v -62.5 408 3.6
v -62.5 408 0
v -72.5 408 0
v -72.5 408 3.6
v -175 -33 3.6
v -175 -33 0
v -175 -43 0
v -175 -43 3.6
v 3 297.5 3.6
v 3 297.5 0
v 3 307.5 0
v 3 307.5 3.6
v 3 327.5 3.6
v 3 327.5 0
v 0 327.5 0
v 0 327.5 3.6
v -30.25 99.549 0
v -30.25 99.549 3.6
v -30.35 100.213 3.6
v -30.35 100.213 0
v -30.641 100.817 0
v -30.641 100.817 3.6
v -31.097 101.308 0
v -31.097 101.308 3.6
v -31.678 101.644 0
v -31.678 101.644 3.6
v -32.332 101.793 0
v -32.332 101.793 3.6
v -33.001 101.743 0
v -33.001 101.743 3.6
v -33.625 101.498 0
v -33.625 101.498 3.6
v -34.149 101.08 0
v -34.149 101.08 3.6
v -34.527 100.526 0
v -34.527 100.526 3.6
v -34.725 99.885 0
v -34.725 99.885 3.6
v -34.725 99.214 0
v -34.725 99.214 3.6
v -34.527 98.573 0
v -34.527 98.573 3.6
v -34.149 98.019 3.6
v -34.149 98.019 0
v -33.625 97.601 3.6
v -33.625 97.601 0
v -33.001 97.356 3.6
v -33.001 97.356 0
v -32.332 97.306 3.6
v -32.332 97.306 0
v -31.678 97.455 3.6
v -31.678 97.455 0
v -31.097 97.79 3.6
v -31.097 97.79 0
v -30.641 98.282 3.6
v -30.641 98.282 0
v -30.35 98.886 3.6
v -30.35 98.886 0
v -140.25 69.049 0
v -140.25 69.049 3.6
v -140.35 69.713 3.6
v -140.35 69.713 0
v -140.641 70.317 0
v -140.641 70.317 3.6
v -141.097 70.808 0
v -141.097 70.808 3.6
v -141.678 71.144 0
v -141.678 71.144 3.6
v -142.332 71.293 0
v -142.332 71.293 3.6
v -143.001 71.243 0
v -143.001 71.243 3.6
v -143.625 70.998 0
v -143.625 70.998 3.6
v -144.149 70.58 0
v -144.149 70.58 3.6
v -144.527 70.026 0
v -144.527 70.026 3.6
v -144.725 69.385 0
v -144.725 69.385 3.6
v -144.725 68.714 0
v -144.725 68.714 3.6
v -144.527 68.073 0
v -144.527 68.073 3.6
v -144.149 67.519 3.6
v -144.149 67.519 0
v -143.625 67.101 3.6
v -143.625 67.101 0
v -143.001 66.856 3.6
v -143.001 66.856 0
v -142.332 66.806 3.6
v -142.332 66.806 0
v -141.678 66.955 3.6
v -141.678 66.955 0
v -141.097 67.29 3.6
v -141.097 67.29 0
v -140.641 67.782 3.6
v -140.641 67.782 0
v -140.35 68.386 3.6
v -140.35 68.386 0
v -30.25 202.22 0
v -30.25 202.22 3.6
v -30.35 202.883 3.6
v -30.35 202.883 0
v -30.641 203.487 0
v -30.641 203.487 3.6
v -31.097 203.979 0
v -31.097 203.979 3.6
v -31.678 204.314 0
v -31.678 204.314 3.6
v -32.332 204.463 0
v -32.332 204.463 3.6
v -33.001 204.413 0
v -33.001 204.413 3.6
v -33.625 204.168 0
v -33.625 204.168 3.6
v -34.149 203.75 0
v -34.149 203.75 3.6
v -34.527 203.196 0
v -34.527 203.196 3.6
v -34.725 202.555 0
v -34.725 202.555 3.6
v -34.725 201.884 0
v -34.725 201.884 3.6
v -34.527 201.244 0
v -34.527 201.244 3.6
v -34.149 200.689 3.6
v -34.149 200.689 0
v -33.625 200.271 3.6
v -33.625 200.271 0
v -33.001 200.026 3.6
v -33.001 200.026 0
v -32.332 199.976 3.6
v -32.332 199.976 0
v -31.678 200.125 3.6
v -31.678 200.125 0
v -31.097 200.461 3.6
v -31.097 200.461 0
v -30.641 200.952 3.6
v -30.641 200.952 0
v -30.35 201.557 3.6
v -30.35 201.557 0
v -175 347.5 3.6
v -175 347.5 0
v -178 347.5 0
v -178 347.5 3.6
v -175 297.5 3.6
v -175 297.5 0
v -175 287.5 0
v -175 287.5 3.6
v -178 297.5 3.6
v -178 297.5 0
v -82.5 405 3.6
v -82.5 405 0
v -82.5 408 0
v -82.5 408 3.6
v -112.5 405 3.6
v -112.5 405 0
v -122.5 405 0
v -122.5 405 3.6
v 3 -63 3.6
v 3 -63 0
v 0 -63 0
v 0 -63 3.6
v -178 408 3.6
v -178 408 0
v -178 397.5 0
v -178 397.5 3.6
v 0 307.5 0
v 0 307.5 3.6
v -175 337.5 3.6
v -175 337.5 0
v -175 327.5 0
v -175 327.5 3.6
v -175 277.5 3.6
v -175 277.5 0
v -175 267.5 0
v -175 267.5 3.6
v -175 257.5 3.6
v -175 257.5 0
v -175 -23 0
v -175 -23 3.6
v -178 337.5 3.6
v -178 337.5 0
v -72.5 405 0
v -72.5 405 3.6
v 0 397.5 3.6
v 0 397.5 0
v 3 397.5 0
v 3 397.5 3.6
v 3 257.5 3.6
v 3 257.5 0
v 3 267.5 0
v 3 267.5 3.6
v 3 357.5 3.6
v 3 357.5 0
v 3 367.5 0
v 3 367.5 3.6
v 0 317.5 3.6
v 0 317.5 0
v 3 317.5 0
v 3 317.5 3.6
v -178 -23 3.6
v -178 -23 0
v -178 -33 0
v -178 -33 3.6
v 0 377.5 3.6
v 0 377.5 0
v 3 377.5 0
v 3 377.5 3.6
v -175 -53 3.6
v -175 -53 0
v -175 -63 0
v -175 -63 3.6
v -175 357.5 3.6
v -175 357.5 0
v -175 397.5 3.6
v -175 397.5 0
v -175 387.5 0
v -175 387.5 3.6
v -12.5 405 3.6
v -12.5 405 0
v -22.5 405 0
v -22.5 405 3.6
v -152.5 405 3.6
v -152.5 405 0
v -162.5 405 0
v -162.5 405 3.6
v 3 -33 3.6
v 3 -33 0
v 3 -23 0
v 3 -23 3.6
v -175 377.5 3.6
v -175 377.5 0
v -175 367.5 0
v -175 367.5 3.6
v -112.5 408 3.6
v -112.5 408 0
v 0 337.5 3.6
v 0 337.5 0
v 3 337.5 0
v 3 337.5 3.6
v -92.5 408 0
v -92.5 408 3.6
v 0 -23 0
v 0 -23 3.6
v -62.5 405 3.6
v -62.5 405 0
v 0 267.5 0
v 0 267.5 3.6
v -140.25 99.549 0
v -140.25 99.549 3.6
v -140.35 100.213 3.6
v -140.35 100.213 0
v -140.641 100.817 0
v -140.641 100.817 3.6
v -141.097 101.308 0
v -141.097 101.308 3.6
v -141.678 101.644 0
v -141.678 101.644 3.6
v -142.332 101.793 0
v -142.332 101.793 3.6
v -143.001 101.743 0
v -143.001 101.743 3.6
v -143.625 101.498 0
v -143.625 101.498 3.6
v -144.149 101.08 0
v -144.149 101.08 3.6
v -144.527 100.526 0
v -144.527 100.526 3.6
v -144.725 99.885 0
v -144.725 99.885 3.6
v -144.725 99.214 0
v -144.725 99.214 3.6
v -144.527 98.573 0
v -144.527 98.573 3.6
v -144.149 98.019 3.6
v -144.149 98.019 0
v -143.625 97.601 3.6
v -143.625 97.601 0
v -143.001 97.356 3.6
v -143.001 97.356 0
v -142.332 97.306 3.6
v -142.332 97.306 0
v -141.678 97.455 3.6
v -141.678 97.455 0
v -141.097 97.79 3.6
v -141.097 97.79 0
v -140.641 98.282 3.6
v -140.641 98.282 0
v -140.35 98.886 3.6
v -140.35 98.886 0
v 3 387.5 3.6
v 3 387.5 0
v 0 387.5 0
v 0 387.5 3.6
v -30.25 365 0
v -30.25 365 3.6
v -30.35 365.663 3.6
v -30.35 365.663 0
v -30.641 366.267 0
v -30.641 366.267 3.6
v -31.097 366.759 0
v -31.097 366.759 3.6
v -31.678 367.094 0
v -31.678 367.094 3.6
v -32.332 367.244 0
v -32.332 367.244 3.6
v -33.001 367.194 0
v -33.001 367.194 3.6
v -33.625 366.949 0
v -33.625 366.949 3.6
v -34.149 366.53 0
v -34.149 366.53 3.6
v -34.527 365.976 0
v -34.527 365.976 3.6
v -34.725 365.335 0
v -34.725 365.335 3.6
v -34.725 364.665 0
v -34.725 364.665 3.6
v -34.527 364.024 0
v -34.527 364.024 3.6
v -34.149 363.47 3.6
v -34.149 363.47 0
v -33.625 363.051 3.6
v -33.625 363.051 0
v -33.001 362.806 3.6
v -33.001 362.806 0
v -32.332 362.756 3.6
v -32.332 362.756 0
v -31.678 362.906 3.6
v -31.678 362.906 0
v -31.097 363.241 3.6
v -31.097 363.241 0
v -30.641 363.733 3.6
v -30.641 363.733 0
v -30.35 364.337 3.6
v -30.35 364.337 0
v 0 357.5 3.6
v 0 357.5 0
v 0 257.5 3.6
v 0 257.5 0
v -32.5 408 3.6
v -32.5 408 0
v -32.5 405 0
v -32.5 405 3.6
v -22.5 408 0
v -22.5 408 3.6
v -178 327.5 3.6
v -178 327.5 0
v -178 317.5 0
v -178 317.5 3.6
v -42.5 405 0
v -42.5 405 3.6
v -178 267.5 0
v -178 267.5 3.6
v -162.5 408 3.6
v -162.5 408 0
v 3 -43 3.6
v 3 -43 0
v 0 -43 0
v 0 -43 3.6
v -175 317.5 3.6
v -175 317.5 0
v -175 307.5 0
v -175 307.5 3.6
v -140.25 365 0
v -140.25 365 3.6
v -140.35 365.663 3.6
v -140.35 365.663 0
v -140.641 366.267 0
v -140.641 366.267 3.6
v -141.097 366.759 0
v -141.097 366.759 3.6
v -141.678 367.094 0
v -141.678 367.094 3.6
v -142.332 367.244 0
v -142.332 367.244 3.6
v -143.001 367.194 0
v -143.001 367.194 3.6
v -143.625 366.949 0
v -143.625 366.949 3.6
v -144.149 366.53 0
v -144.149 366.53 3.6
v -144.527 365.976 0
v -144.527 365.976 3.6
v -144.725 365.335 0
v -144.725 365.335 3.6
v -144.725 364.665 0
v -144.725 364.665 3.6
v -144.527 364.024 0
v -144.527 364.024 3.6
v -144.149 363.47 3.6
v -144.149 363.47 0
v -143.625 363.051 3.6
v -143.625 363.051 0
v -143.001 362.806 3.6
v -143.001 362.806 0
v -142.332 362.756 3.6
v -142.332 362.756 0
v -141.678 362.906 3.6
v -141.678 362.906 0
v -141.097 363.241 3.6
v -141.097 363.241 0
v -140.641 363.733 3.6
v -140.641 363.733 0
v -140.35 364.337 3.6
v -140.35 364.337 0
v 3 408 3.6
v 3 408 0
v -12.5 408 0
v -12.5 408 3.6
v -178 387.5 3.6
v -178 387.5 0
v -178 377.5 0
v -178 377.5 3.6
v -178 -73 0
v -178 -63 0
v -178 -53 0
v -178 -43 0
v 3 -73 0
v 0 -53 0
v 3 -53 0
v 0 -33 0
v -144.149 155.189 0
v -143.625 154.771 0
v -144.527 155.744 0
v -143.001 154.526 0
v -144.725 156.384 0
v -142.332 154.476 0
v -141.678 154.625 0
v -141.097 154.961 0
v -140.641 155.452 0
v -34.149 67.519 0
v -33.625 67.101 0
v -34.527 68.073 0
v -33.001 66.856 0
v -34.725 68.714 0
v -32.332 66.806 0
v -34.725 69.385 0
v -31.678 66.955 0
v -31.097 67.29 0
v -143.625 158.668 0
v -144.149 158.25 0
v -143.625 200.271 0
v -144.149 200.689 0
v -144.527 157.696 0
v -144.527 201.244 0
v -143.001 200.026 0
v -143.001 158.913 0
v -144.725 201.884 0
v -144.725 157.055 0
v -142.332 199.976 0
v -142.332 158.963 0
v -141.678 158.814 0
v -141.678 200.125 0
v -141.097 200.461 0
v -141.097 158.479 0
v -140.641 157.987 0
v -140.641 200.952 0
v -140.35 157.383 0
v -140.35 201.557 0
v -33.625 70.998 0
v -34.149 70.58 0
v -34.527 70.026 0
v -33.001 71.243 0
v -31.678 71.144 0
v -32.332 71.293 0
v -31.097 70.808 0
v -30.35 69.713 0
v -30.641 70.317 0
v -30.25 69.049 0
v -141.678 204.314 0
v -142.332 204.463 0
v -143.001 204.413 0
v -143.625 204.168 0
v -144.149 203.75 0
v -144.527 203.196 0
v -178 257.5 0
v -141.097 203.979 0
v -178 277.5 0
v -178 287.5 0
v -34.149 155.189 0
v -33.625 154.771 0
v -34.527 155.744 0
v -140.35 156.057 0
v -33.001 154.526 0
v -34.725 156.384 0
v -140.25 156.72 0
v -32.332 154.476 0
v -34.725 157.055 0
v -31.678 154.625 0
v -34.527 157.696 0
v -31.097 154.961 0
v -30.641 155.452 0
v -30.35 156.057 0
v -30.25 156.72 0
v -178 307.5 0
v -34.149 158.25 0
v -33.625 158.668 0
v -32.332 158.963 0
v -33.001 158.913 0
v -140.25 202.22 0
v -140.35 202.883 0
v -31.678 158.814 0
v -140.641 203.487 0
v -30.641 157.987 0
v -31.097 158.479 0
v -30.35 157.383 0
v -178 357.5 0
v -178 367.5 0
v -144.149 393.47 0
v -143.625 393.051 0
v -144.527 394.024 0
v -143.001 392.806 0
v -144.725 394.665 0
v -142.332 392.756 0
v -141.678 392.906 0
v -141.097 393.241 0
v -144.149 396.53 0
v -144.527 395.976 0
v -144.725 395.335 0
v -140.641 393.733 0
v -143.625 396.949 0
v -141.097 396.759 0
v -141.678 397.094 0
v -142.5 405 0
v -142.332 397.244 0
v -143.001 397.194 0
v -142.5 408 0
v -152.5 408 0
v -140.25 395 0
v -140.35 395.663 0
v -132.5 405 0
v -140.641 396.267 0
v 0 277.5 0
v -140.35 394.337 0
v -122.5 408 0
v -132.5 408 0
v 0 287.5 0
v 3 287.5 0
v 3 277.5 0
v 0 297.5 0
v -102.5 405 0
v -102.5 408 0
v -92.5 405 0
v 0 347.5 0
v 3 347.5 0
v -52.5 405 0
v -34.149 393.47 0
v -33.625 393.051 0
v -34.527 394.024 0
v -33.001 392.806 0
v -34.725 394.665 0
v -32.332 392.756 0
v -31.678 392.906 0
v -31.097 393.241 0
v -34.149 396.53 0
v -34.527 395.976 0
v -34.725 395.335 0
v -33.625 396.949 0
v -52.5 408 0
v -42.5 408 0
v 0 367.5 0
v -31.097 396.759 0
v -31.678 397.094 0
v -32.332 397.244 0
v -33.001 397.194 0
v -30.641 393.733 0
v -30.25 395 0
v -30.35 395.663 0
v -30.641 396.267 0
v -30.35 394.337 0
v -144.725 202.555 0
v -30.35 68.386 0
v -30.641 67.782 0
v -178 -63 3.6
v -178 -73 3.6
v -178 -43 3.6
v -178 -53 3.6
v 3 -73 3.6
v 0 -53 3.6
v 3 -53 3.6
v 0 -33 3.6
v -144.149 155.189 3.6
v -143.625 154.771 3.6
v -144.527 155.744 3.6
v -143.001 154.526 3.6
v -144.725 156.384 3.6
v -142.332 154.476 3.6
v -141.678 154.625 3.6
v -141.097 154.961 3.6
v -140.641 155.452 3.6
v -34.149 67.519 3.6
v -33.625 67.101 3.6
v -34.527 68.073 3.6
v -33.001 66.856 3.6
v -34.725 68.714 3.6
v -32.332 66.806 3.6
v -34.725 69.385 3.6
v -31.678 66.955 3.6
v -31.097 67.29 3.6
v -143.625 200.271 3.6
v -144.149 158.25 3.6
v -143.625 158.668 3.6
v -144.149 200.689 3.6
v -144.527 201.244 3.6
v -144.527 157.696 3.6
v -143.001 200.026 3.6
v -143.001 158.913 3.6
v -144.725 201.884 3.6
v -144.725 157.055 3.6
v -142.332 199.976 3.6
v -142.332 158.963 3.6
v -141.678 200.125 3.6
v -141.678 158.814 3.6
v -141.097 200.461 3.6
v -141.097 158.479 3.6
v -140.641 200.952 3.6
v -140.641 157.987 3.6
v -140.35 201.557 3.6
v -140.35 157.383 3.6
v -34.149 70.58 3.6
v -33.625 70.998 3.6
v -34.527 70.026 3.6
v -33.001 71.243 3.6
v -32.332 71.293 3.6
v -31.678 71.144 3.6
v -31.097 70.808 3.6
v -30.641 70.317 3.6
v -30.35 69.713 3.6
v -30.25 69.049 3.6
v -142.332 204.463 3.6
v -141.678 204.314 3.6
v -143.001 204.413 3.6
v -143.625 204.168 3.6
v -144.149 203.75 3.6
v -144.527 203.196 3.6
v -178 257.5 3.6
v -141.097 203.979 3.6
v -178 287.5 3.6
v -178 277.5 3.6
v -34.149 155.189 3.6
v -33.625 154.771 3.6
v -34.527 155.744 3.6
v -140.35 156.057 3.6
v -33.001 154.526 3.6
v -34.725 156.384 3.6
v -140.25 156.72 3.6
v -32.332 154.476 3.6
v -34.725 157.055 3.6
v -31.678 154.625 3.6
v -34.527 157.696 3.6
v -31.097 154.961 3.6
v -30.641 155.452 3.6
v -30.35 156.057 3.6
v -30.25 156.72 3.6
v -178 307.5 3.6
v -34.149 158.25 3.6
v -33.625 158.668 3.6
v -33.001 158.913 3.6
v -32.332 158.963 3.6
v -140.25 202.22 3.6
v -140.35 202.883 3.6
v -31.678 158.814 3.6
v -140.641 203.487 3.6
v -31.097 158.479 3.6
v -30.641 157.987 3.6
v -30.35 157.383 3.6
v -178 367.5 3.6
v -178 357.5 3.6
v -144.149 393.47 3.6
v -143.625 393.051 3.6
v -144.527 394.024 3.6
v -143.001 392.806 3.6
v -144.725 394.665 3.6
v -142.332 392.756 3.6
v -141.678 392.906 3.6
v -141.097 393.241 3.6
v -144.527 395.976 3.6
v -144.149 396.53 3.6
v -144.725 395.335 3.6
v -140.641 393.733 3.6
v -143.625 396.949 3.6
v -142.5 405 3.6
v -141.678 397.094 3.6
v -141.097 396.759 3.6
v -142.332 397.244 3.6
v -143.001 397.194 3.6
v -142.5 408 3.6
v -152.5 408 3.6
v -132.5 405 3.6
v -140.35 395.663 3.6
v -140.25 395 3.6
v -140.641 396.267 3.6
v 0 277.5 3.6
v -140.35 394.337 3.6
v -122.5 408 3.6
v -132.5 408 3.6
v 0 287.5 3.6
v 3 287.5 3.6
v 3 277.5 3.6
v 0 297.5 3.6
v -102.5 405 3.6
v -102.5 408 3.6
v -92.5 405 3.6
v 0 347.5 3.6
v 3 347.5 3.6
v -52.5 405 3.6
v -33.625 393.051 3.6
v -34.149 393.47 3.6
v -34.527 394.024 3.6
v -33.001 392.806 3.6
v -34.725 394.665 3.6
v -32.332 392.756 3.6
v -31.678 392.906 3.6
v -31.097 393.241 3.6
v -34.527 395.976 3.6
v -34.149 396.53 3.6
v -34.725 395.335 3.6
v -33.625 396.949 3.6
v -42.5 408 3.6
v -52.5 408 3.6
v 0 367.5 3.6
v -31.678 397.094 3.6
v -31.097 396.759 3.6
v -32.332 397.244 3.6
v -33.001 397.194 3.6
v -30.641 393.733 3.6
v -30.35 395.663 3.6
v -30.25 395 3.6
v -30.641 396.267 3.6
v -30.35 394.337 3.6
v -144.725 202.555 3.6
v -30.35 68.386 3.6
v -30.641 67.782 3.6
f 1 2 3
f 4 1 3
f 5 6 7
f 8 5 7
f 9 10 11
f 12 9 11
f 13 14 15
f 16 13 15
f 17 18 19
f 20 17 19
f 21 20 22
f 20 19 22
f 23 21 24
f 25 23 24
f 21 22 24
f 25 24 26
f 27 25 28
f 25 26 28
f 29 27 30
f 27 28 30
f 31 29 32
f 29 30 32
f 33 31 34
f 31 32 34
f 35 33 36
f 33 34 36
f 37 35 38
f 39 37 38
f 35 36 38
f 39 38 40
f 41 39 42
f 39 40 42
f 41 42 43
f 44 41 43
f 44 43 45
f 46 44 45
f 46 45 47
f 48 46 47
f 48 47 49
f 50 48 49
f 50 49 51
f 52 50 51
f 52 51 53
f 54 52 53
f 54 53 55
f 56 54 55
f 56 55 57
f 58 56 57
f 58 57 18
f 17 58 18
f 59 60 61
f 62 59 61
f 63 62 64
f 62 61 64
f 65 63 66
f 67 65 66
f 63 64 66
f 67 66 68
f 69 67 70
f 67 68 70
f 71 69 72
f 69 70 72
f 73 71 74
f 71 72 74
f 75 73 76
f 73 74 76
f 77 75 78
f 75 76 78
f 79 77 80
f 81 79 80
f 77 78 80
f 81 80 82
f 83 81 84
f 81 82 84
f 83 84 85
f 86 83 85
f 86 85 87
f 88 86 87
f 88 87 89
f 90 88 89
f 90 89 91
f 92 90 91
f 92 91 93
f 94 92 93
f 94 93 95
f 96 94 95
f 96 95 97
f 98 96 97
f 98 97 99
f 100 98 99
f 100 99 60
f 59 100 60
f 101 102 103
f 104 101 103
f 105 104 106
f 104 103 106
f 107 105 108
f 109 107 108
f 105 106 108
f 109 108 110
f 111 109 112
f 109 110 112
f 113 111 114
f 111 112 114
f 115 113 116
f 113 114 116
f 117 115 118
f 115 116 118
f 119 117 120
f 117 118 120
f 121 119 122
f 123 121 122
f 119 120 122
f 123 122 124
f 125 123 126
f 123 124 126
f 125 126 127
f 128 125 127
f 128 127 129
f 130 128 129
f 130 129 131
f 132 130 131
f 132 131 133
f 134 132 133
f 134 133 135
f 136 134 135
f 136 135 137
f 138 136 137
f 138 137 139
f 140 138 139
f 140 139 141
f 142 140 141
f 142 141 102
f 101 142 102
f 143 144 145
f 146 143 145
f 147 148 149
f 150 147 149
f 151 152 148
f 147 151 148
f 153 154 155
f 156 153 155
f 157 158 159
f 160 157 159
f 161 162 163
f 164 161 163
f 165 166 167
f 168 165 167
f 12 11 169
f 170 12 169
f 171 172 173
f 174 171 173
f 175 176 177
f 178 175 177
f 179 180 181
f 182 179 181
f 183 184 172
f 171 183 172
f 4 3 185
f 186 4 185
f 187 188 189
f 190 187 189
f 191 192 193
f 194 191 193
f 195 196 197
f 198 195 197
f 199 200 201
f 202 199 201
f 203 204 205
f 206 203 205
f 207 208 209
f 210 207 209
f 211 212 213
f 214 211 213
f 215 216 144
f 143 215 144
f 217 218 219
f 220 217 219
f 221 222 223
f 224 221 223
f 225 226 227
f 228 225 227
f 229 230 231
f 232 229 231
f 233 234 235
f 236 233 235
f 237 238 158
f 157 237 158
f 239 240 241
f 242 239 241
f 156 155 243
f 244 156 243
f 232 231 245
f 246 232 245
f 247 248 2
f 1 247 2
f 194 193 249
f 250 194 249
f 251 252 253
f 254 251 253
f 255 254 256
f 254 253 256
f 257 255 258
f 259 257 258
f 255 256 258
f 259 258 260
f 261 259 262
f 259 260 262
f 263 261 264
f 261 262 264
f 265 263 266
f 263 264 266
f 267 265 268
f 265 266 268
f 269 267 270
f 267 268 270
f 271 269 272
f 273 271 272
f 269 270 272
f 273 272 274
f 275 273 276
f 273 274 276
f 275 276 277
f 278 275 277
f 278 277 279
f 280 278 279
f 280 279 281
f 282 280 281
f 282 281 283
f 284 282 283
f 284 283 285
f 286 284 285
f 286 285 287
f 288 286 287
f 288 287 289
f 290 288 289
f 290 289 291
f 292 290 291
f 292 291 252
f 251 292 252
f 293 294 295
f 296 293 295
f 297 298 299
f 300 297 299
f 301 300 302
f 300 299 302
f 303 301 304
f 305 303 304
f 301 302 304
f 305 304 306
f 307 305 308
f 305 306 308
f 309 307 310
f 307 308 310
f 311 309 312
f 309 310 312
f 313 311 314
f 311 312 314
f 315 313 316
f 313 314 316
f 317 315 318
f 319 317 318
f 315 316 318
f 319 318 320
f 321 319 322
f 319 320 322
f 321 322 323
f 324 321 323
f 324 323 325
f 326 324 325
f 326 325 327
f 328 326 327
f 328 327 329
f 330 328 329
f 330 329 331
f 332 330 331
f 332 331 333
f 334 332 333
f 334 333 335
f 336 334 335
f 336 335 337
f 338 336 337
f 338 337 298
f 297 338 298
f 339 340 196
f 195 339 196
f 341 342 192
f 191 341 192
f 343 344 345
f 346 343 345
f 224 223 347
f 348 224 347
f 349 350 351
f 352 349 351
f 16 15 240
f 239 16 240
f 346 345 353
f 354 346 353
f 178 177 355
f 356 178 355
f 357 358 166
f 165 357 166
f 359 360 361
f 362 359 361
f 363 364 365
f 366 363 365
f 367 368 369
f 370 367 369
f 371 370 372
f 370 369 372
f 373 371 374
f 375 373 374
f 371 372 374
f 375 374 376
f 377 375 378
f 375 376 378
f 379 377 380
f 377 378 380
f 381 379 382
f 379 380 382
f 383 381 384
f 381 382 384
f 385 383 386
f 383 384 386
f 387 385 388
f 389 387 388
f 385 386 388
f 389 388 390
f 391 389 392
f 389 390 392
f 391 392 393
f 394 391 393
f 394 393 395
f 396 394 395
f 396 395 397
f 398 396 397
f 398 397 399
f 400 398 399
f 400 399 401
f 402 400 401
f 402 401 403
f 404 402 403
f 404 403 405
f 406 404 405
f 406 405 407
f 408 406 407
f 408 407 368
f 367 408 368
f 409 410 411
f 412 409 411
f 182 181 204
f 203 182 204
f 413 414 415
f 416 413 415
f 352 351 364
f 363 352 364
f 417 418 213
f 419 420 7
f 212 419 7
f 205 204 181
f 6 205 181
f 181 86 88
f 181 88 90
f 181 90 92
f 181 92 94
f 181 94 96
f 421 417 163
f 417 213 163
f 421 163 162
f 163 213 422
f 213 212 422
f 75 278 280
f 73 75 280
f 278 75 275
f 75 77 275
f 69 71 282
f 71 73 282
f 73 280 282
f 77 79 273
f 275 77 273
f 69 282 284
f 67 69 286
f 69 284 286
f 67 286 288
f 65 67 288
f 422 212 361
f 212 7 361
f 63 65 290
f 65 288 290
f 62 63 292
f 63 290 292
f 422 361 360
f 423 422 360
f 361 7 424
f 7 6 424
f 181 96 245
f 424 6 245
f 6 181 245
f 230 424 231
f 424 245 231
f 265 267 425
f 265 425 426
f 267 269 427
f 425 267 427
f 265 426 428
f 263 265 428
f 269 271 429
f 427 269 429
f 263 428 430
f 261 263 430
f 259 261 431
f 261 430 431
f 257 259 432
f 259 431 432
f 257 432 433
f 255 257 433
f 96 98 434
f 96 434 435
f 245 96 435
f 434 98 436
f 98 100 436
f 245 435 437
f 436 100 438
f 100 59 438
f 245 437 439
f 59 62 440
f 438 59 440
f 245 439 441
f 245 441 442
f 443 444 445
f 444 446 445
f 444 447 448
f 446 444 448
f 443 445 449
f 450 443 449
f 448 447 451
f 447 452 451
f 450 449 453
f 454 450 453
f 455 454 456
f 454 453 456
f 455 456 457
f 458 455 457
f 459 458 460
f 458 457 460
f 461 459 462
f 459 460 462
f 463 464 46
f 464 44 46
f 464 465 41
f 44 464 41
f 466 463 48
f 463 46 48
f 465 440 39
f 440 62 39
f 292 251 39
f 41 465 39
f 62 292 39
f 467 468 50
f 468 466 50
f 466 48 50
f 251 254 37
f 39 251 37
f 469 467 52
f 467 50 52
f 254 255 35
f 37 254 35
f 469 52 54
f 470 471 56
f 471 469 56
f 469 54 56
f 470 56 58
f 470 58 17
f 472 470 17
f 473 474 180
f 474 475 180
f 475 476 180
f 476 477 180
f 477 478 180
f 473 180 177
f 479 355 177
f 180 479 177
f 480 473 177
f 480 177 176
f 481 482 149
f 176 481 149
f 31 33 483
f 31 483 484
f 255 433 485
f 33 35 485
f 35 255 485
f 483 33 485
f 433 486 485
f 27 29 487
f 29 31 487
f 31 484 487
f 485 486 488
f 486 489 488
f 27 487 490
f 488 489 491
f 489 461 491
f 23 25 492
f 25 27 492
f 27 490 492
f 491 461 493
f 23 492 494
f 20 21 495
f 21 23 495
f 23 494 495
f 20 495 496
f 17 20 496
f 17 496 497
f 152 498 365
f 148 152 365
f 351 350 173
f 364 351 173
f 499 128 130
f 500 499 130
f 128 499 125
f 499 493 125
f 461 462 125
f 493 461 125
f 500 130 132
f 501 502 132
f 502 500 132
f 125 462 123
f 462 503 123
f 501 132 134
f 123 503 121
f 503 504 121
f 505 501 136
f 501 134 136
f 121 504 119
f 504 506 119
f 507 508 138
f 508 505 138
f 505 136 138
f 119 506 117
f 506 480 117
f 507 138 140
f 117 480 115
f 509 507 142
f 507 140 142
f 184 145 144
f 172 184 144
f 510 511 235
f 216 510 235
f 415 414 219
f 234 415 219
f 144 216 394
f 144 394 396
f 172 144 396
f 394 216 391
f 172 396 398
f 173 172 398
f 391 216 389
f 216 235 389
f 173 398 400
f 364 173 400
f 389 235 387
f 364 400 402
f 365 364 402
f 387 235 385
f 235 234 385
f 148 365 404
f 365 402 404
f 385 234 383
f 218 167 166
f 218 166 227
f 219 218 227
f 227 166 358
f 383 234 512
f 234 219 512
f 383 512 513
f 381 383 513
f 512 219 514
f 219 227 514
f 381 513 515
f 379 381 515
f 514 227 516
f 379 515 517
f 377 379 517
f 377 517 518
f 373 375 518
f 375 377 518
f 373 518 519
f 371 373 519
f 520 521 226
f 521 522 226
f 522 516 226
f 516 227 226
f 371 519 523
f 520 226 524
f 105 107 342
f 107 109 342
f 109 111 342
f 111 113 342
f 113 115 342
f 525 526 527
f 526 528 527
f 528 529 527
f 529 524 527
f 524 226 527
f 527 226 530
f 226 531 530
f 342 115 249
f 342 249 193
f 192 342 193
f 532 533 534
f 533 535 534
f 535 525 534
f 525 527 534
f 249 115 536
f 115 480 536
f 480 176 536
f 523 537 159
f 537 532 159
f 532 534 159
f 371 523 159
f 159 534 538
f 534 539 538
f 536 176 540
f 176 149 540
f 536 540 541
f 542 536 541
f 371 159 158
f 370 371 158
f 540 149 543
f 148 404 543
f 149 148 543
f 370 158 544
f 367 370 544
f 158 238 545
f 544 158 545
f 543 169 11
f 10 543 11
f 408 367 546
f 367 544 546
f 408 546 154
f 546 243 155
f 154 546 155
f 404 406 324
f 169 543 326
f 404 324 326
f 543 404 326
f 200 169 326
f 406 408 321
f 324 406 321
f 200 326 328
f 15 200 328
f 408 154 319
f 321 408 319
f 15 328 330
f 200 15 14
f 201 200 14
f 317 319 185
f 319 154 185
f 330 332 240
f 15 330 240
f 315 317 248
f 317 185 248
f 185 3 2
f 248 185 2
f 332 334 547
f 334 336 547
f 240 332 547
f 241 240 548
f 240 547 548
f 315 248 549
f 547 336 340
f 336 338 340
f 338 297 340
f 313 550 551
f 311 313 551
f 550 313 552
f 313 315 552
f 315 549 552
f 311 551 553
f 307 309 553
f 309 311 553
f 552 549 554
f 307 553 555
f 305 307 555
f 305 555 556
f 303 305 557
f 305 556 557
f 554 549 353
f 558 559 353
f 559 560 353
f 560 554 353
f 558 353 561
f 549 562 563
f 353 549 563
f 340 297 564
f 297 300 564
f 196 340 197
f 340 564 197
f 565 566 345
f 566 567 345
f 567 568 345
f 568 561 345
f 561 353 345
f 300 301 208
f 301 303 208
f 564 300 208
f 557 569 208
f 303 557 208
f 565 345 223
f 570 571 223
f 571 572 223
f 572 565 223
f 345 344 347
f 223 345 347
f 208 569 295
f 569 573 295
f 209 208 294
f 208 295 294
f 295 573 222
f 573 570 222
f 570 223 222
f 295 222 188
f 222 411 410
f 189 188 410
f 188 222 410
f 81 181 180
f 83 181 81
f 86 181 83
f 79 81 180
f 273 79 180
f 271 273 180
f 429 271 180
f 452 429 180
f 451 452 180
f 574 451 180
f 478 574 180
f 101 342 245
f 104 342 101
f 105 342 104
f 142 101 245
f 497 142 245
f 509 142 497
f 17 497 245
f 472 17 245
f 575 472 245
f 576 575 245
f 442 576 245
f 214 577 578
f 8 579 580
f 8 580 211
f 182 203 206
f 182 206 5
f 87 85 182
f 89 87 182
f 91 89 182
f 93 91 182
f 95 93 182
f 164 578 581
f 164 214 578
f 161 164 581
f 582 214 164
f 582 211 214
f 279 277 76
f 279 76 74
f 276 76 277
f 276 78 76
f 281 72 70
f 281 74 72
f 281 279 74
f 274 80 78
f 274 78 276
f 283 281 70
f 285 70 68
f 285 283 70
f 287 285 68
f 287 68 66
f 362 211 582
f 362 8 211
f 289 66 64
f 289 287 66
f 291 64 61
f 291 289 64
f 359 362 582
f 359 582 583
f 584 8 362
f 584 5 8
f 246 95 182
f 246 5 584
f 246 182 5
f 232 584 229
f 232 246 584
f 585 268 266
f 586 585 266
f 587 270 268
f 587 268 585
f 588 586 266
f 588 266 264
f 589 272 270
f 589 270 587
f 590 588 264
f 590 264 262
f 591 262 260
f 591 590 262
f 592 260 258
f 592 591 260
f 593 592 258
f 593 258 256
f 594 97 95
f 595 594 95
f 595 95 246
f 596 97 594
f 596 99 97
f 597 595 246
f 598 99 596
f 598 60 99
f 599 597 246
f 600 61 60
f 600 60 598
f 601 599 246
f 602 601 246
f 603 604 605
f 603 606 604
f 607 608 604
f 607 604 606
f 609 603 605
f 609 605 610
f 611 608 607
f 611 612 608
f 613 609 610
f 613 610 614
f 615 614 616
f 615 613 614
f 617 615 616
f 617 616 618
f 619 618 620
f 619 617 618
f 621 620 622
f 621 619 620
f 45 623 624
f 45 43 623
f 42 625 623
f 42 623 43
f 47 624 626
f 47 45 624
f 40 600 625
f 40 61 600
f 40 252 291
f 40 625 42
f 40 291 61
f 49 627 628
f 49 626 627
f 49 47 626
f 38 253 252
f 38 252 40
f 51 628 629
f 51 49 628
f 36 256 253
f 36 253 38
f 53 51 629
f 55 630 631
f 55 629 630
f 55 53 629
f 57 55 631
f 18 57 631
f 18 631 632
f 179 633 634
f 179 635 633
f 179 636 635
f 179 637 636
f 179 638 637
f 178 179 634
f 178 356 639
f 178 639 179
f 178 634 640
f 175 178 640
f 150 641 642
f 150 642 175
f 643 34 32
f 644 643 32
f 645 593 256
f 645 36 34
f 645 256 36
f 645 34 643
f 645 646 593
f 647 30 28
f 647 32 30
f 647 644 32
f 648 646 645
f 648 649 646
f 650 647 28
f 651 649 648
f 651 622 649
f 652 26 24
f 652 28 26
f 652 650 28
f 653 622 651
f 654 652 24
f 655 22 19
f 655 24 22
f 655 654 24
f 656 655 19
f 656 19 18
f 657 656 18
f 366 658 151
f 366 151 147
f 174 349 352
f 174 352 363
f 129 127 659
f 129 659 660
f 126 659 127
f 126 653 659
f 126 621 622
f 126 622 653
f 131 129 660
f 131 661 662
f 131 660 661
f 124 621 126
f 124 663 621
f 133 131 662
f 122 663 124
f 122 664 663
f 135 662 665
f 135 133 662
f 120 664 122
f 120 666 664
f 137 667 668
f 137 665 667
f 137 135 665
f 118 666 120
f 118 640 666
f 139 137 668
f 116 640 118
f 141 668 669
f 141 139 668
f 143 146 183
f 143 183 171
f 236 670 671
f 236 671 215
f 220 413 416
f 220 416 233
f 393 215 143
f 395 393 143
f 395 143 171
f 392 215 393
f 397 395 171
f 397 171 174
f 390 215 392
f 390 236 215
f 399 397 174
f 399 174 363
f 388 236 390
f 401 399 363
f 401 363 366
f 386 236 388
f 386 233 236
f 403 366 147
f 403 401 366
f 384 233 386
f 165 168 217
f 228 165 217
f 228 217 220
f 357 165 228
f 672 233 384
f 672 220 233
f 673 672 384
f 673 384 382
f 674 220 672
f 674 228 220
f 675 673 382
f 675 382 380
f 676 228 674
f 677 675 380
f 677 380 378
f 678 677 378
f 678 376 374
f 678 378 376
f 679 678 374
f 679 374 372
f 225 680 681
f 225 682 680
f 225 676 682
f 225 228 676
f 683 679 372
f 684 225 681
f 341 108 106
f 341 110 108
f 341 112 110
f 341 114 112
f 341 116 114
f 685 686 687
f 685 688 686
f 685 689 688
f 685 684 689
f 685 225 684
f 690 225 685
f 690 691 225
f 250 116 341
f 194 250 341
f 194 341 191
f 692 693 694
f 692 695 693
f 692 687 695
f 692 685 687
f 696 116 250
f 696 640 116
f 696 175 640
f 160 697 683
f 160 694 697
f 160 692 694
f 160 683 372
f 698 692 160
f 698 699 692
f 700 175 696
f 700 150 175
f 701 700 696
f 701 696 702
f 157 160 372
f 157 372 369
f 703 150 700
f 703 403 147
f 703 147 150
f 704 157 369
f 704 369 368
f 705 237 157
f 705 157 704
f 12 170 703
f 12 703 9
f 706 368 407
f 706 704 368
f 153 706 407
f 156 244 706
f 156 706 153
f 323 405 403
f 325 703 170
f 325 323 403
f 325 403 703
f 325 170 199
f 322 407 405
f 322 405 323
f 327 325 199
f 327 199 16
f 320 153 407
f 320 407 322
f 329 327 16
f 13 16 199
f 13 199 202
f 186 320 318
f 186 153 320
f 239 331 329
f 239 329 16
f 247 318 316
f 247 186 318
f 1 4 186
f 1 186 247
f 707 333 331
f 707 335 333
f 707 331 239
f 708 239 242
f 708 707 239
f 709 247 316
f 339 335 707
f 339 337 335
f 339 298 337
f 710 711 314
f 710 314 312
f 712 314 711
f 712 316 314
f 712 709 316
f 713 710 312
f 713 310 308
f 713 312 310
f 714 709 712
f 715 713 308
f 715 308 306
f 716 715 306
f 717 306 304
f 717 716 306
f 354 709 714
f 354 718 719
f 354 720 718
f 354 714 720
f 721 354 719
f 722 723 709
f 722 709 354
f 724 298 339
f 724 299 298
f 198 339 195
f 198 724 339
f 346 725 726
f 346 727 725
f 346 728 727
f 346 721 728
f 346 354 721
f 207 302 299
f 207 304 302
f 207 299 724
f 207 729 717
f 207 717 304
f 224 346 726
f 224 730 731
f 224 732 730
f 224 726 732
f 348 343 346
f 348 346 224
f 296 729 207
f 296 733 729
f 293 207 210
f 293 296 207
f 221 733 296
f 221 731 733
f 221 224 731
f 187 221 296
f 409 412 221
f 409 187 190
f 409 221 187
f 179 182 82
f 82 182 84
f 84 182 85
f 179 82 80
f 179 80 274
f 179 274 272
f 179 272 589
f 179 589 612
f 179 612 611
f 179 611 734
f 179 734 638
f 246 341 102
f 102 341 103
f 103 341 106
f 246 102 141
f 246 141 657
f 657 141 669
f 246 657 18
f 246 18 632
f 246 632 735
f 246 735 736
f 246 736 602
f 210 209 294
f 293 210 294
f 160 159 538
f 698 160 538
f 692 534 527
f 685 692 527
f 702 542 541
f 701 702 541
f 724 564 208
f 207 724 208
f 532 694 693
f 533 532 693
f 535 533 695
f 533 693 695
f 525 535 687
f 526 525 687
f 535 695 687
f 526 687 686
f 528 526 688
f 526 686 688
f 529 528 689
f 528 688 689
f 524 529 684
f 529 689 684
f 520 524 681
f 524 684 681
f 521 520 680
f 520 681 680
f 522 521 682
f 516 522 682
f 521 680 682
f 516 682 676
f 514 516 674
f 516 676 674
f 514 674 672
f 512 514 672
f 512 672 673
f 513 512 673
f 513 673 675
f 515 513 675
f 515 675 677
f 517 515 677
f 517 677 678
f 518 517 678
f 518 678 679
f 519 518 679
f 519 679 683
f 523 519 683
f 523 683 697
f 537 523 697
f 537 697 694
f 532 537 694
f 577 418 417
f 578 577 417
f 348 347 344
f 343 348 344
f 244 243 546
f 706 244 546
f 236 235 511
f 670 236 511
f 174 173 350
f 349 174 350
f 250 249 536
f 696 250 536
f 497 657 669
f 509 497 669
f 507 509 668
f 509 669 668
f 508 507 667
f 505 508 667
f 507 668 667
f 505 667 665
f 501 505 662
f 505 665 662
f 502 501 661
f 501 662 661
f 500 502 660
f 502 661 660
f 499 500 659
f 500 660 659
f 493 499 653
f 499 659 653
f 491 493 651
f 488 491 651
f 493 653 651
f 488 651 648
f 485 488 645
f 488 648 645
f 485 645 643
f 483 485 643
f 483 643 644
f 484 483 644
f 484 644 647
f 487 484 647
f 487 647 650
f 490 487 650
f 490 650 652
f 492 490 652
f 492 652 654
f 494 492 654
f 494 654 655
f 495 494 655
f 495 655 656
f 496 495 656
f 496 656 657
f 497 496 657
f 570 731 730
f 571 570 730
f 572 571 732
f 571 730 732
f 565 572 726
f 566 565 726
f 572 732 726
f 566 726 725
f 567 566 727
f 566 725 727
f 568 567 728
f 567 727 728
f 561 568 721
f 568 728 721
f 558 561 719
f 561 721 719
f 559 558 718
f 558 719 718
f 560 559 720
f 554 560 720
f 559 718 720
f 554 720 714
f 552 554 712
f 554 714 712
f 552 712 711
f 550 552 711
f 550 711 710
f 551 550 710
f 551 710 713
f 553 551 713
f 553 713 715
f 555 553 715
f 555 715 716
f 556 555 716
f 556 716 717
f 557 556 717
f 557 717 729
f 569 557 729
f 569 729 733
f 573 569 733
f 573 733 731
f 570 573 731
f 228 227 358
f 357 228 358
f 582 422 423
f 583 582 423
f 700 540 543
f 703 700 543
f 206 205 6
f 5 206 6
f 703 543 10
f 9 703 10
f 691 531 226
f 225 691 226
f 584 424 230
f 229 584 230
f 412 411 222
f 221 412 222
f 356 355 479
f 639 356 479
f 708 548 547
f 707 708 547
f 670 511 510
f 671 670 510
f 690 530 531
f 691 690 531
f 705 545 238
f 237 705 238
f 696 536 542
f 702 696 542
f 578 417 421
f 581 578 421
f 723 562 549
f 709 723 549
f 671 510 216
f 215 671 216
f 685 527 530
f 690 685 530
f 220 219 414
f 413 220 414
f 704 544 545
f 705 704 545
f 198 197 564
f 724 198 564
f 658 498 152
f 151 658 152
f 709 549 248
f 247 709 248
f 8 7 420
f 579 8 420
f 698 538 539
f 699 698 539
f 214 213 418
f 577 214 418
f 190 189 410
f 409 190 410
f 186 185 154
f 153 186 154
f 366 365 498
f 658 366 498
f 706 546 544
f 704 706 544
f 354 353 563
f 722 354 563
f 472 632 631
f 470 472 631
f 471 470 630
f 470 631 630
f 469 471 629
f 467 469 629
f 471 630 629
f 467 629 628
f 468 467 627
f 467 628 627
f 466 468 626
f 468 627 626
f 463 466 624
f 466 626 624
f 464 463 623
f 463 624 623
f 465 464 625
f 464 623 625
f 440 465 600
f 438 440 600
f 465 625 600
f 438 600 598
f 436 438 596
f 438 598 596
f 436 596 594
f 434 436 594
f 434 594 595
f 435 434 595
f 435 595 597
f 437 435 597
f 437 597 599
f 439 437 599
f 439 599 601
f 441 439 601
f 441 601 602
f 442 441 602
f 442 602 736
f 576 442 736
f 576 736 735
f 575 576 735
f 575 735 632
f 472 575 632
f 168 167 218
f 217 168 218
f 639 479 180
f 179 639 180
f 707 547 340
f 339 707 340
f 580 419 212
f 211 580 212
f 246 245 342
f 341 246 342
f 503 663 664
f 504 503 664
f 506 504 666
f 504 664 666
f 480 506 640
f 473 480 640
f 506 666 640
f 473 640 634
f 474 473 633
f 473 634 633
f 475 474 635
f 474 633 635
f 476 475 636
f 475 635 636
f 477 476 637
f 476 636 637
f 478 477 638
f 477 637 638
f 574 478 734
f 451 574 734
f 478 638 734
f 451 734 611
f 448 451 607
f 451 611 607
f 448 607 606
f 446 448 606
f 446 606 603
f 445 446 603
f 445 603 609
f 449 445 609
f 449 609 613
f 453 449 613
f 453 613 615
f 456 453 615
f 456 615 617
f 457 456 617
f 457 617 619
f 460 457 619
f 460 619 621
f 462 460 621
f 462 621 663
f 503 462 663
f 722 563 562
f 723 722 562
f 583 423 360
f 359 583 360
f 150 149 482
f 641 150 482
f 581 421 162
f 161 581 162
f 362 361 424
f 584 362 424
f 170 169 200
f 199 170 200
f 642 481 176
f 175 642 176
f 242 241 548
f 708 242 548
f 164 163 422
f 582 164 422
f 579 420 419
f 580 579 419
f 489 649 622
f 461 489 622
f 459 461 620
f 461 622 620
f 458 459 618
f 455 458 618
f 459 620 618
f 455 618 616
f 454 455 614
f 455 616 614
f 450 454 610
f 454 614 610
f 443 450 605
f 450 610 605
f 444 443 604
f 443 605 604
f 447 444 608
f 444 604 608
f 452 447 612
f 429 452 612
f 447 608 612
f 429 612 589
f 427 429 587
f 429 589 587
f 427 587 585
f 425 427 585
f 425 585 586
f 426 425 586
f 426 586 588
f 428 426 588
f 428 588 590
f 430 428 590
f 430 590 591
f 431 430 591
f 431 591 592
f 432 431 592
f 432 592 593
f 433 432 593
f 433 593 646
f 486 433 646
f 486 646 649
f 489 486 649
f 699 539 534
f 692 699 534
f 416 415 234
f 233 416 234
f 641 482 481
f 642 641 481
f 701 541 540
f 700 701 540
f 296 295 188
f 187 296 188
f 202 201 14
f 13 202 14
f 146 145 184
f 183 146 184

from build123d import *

# Parameters (mm, degrees)
BOSS_EXTRUDE1_DEPTH = 3.6
SKETCH3_R           = 2.25
CUT_EXTRUDE1_DEPTH  = 10


with BuildPart() as part:
    # Sketch1 → Boss-Extrude1 (new body)
    with BuildSketch(Plane.XY):
        Polygon((3, 408), (-12.5, 408), (-12.5, 405), (-22.5, 405), (-22.5, 408), (-32.5, 408), (-32.5, 405), (-42.5, 405), (-42.5, 408), (-52.5, 408), (-52.5, 405), (-62.5, 405), (-62.5, 408), (-72.5, 408), (-72.5, 405), (-82.5, 405), (-82.5, 408), (-92.5, 408), (-92.5, 405), (-102.5, 405), (-102.5, 408), (-112.5, 408), (-112.5, 405), (-122.5, 405), (-122.5, 408), (-132.5, 408), (-132.5, 405), (-142.5, 405), (-142.5, 408), (-152.5, 408), (-152.5, 405), (-162.5, 405), (-162.5, 408), (-178, 408), (-178, 397.5), (-175, 397.5), (-175, 387.5), (-178, 387.5), (-178, 377.5), (-175, 377.5), (-175, 367.5), (-178, 367.5), (-178, 357.5), (-175, 357.5), (-175, 347.5), (-178, 347.5), (-178, 337.5), (-175, 337.5), (-175, 327.5), (-178, 327.5), (-178, 317.5), (-175, 317.5), (-175, 307.5), (-178, 307.5), (-178, 297.5), (-175, 297.5), (-175, 287.5), (-178, 287.5), (-178, 277.5), (-175, 277.5), (-175, 267.5), (-178, 267.5), (-178, 257.5), (-175, 257.5), (-175, 0), (-175, -23), (-178, -23), (-178, -33), (-175, -33), (-175, -43), (-178, -43), (-178, -53), (-175, -53), (-175, -63), (-178, -63), (-178, -73), (3, -73), (3, -63), (0, -63), (0, -53), (3, -53), (3, -43), (0, -43), (0, -33), (3, -33), (3, -23), (0, -23), (0, 0), (0, 257.5), (3, 257.5), (3, 267.5), (0, 267.5), (0, 277.5), (3, 277.5), (3, 287.5), (0, 287.5), (0, 297.5), (3, 297.5), (3, 307.5), (0, 307.5), (0, 317.5), (3, 317.5), (3, 327.5), (0, 327.5), (0, 337.5), (3, 337.5), (3, 347.5), (0, 347.5), (0, 357.5), (3, 357.5), (3, 367.5), (0, 367.5), (0, 377.5), (3, 377.5), (3, 387.5), (0, 387.5), (0, 397.5), (3, 397.5), align=None)
    extrude(amount=BOSS_EXTRUDE1_DEPTH)

    # Sketch3 → Cut-Extrude1 (cut)
    with BuildSketch(Plane.XY.offset(3.6)):
        with Locations((-142.5, 365)):
            Circle(SKETCH3_R)
        with Locations((-32.5, 69.049357195)):
            Circle(SKETCH3_R)
        with Locations((-32.5, 99.549357195)):
            Circle(SKETCH3_R)
        with Locations((-142.5, 69.049357195)):
            Circle(SKETCH3_R)
        with Locations((-142.5, 99.549357195)):
            Circle(SKETCH3_R)
        with Locations((-142.5, 156.719761425)):
            Circle(SKETCH3_R)
        with Locations((-32.5, 156.719761425)):
            Circle(SKETCH3_R)
        with Locations((-32.5, 202.219761425)):
            Circle(SKETCH3_R)
        with Locations((-142.5, 202.219761425)):
            Circle(SKETCH3_R)
        with Locations((-32.5, 365)):
            Circle(SKETCH3_R)
        with Locations((-32.5, 395)):
            Circle(SKETCH3_R)
        with Locations((-142.5, 395)):
            Circle(SKETCH3_R)
    extrude(amount=-CUT_EXTRUDE1_DEPTH, mode=Mode.SUBTRACT)


solid = part.part
